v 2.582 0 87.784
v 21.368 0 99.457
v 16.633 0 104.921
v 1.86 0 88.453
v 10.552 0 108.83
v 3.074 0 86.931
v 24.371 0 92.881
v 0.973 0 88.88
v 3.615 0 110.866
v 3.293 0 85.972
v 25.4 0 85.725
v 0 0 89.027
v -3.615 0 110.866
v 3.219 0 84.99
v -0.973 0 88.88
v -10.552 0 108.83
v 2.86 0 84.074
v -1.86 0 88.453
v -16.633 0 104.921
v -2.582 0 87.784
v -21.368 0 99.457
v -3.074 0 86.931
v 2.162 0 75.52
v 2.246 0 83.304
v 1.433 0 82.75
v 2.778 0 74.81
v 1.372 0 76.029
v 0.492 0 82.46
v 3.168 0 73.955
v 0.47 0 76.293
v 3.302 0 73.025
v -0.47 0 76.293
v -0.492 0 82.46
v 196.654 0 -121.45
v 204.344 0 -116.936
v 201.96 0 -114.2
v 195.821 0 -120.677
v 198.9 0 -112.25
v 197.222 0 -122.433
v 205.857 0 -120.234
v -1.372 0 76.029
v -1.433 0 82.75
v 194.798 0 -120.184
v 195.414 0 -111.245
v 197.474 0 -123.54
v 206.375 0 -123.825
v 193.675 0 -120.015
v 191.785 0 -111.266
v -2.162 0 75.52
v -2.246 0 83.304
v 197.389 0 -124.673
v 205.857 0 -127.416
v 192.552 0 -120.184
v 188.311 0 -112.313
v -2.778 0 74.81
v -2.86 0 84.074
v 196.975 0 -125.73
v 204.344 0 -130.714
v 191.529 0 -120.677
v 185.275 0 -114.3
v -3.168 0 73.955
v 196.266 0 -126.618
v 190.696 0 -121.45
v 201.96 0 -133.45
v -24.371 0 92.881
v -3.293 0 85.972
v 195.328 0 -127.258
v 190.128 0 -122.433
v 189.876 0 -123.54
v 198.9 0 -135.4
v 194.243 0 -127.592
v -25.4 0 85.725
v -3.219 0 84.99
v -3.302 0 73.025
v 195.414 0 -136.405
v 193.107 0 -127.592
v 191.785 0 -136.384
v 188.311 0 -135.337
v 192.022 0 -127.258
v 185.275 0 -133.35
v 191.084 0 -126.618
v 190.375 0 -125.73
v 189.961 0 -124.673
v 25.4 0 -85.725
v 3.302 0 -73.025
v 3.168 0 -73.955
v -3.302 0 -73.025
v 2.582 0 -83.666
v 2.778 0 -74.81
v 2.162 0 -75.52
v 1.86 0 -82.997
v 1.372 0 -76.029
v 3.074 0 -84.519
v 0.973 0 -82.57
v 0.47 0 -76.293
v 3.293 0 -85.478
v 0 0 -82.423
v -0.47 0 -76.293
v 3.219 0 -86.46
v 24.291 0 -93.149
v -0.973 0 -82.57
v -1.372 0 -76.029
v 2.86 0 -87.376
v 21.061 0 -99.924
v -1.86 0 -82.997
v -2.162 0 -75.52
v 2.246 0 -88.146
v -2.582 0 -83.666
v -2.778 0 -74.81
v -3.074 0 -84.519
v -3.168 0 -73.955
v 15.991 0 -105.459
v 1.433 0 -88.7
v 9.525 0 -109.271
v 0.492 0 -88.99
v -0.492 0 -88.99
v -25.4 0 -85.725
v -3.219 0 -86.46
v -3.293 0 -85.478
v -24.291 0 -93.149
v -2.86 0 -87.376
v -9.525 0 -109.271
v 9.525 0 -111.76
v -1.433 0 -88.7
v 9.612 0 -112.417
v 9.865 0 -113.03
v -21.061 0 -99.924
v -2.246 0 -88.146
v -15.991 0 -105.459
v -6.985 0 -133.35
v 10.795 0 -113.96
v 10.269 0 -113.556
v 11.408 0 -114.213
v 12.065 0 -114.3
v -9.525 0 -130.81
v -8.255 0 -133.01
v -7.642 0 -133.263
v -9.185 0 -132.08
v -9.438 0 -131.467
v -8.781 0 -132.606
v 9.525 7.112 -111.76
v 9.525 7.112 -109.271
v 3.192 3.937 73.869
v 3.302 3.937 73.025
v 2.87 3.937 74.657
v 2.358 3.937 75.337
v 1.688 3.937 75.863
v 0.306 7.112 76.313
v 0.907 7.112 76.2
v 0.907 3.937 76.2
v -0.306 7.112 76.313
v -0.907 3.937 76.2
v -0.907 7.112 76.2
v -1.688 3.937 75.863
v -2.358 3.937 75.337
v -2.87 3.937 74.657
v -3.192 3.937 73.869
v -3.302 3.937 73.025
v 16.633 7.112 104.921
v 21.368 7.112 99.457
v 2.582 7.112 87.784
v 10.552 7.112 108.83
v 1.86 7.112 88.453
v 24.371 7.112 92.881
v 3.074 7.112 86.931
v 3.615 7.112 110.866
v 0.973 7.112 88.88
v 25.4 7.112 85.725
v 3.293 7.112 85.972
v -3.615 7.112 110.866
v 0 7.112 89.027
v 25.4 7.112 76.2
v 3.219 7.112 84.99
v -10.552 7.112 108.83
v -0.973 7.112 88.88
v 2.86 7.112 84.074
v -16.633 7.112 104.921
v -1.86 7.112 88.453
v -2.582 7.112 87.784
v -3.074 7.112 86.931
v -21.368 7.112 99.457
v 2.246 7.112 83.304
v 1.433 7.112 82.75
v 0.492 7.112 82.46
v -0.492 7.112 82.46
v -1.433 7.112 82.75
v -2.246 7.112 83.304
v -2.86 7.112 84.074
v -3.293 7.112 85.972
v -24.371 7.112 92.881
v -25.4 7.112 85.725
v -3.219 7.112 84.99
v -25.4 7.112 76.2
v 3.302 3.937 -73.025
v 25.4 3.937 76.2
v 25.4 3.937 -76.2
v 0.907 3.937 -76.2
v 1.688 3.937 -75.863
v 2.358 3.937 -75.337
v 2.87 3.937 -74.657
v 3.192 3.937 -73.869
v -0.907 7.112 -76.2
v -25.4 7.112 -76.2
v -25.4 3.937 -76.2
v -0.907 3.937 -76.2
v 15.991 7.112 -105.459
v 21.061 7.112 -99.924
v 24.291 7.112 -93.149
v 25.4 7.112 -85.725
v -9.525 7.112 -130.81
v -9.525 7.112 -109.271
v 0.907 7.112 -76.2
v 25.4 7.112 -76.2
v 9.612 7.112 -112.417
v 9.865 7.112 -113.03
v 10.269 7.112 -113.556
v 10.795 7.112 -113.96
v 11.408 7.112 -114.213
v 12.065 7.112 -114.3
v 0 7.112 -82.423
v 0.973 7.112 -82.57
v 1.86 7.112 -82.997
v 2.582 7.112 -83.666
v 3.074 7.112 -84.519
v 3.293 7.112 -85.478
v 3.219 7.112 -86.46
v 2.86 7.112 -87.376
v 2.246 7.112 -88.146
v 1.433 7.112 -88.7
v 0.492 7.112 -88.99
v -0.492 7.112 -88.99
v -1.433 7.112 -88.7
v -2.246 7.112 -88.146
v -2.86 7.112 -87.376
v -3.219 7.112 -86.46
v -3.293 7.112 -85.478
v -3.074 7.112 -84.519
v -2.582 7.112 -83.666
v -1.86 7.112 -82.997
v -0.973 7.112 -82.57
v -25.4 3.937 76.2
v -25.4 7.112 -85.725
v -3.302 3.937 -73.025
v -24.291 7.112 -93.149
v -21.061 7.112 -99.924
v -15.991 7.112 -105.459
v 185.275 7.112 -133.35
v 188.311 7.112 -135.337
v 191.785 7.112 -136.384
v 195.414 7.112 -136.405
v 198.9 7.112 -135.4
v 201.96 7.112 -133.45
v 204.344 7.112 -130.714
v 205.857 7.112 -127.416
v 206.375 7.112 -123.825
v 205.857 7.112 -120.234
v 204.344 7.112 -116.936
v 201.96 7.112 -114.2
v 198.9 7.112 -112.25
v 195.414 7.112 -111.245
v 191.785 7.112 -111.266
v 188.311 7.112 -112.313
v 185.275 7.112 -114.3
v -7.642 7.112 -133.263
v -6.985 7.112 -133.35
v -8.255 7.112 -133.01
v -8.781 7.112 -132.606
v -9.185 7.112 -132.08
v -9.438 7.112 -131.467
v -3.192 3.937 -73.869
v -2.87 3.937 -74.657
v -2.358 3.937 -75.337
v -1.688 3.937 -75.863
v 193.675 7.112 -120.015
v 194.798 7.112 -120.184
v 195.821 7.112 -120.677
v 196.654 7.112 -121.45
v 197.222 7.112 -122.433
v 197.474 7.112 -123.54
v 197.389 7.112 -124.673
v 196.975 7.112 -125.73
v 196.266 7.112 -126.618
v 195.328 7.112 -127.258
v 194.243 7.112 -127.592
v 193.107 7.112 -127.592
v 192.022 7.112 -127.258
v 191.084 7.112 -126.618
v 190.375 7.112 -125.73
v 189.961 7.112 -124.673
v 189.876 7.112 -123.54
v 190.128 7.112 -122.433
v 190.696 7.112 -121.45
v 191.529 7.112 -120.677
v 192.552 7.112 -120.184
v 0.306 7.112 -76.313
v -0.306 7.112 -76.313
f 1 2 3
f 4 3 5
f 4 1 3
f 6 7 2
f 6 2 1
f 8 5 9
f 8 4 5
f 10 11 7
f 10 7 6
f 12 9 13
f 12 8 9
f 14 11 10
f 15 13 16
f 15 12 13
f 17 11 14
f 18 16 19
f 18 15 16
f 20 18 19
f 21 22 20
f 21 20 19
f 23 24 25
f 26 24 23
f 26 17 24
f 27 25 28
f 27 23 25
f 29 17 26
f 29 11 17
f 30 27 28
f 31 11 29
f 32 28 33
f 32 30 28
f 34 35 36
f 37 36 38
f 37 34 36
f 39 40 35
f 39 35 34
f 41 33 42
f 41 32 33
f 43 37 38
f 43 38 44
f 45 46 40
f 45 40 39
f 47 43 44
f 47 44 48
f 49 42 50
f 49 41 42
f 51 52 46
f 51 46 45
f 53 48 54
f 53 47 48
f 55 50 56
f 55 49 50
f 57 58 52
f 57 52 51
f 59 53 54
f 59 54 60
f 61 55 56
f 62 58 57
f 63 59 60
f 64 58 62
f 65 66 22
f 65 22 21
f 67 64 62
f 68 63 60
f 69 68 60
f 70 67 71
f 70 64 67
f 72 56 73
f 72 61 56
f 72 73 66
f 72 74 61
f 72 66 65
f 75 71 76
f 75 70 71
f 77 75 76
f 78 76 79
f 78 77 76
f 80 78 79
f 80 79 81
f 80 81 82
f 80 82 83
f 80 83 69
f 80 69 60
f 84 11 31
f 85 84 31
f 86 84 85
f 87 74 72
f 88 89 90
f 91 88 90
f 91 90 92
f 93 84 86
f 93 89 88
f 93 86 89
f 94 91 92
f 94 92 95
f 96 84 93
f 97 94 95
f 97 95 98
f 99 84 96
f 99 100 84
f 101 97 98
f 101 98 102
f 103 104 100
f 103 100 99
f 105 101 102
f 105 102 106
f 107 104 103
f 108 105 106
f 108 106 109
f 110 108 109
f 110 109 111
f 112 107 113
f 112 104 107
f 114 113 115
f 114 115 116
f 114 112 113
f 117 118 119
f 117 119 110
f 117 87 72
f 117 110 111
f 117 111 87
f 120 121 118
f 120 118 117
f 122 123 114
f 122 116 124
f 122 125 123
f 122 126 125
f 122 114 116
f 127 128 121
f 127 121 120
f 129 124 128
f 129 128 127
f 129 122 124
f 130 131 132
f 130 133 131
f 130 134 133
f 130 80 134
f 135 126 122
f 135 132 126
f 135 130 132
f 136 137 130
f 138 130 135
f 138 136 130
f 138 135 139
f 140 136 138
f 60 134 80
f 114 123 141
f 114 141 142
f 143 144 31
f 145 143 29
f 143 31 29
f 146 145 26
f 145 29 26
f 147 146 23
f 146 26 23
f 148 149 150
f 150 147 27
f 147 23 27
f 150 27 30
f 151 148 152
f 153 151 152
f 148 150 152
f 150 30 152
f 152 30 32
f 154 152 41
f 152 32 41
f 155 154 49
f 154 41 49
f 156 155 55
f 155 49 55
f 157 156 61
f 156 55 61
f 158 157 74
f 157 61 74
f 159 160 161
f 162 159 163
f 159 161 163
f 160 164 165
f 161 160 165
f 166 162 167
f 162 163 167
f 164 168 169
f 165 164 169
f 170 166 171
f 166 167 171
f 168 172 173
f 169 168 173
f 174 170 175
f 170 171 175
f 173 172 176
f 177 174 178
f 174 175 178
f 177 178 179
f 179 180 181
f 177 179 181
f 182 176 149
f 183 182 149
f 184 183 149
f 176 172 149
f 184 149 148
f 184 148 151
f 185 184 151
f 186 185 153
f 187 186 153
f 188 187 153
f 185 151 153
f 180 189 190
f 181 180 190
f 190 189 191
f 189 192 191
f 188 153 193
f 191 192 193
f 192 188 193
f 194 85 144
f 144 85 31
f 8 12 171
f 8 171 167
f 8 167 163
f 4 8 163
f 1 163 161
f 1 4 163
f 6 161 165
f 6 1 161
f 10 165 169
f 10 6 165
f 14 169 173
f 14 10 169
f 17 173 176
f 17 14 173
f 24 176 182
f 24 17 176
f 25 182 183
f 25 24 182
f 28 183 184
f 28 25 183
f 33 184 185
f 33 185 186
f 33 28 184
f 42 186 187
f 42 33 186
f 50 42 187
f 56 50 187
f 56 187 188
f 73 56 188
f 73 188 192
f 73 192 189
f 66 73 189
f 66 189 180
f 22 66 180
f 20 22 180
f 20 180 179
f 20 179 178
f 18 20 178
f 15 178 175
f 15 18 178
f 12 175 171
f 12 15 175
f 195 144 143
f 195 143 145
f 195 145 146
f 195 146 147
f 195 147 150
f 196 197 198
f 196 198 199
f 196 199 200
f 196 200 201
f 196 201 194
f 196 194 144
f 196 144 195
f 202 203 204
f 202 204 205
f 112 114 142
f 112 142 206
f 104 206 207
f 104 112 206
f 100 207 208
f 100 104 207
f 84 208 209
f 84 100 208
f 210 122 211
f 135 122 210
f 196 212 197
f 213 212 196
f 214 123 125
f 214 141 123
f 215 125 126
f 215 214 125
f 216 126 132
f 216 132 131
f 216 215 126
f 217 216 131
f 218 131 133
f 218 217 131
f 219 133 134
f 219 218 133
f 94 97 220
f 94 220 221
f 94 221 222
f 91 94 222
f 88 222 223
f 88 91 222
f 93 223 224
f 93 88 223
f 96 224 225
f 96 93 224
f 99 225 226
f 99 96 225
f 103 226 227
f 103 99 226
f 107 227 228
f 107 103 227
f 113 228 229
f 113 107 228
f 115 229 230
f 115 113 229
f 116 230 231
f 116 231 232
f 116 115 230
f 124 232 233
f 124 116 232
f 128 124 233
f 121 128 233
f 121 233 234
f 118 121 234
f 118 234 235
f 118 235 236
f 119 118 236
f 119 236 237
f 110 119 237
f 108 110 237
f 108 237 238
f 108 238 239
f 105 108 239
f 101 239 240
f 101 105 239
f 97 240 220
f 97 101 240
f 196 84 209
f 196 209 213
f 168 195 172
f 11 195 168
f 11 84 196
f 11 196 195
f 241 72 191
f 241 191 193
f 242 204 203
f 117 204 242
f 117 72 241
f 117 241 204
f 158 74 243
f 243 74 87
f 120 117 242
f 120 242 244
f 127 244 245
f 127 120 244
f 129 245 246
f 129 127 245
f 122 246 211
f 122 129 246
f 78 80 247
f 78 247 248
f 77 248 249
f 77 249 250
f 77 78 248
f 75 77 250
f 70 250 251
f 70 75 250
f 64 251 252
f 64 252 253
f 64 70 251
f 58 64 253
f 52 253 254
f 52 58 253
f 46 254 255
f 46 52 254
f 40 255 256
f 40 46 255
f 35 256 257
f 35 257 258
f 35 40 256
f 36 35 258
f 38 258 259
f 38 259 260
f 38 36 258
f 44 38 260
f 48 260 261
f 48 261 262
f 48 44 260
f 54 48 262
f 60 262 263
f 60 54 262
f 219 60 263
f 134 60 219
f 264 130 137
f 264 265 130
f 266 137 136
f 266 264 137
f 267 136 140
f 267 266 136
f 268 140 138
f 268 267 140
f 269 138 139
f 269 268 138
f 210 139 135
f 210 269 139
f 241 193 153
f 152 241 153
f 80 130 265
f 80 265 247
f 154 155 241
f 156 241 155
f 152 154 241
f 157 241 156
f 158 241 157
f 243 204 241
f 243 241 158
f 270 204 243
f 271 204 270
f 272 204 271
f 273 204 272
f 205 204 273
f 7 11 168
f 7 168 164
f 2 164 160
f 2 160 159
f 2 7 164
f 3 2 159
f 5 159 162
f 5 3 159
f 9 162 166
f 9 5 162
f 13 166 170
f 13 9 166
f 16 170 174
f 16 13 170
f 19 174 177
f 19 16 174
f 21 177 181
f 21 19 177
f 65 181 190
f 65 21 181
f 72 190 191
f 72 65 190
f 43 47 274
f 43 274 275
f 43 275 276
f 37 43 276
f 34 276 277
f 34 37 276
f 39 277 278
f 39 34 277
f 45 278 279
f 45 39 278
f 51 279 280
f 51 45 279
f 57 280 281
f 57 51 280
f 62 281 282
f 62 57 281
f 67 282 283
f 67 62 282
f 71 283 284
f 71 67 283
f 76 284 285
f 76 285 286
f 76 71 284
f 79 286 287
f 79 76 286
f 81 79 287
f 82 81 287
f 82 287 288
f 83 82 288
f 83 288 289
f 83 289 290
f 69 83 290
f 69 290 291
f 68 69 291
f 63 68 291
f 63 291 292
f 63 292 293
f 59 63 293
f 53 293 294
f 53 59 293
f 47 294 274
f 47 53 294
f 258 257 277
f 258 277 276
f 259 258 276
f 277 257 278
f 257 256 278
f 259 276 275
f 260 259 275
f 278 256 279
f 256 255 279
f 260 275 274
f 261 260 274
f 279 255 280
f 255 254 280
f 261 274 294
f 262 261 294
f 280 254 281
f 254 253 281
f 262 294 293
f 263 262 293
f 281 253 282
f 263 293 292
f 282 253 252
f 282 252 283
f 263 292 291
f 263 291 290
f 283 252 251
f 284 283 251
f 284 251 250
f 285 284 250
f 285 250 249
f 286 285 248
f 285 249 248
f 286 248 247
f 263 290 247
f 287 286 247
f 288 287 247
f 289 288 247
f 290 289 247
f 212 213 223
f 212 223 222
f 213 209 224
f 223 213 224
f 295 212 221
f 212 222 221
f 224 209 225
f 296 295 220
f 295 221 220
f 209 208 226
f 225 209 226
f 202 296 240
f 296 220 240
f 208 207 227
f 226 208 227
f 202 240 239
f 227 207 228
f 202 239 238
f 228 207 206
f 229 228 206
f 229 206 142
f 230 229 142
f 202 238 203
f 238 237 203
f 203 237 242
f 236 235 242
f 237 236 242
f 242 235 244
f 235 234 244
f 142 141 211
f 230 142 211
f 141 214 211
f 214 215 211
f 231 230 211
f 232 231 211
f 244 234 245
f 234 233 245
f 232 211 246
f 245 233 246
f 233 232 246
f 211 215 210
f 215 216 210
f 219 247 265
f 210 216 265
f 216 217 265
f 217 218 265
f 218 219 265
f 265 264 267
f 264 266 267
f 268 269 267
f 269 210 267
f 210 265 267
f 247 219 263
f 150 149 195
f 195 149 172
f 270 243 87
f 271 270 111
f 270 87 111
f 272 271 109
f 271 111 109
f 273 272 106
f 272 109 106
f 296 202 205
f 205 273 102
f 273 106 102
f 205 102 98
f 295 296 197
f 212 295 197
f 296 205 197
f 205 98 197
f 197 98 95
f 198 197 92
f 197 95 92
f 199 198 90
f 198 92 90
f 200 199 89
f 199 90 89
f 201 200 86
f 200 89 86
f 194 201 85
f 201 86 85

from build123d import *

# Parameters (mm, degrees)
SKETCH1_R           = 3.302
BOSS_EXTRUDE1_DEPTH = 7.112
SKETCH2_W           = 50.8
SKETCH2_H           = 152.4
CUT_EXTRUDE1_DEPTH  = 3.175
SKETCH3_R           = 3.81
BOSS_EXTRUDE2_DEPTH = 7.112
FILLET1_R           = 2.54


with BuildPart() as part:
    # Sketch1 → Boss-Extrude1 (new body)
    with BuildSketch(Plane(origin=(0, 0, 0), x_dir=(1, 0, 0), z_dir=(0, 1, 0))):
        with BuildLine():
            Line((25.4, 85.725), (25.4, -85.725))
            ThreePointArc((25.4, -85.725), (0, -111.125), (-25.4, -85.725))
            Line((-25.4, -85.725), (-25.4, 85.725))
            ThreePointArc((-25.4, 85.725), (0, 111.125), (25.4, 85.725))
        make_face()
        with Locations(Location((0, 85.725, 0), (0, 0, 270))):
            Circle(SKETCH1_R, mode=Mode.SUBTRACT)
        with Locations(Location((0, -85.725, 0), (0, 0, 270))):
            Circle(SKETCH1_R, mode=Mode.SUBTRACT)
        with BuildLine():
            Line((3.302, 73.025), (3.302, -73.025))
            ThreePointArc((3.302, -73.025), (0, -76.327), (-3.302, -73.025))
            Line((-3.302, -73.025), (-3.302, 73.025))
            ThreePointArc((-3.302, 73.025), (0, 76.327), (3.302, 73.025))
        make_face(mode=Mode.SUBTRACT)
    extrude(amount=BOSS_EXTRUDE1_DEPTH)

    # Sketch2 → Cut-Extrude1 (cut)
    with BuildSketch(Plane(origin=(0, 7.112, 0), x_dir=(1, 0, 0), z_dir=(0, 1, 0))):
        Rectangle(SKETCH2_W, SKETCH2_H)
    extrude(amount=-CUT_EXTRUDE1_DEPTH, mode=Mode.SUBTRACT)

    # Sketch3 → Boss-Extrude2 (add)
    with BuildSketch(Plane(origin=(0, 0, 0), x_dir=(1, 0, 0), z_dir=(0, 1, 0))):
        with BuildLine():
            Line((-9.525, 85.725), (-9.525, 133.35))
            Line((-9.525, 133.35), (185.274739587, 133.35))
            ThreePointArc((185.274739587, 133.35), (206.375, 123.825), (185.274739587, 114.3))
            Line((185.274739587, 114.3), (9.525, 114.3))
            Line((9.525, 114.3), (9.525, 85.725))
            Line((9.525, 85.725), (0, 95.25))
            Line((0, 95.25), (-9.525, 85.725))
        make_face()
        with Locations(Location((193.675, 123.825, 0), (0, 0, 270))):
            Circle(SKETCH3_R, mode=Mode.SUBTRACT)
    extrude(amount=BOSS_EXTRUDE2_DEPTH)

    # Fillet1
    fillet1_edges = [part.edges().sort_by_distance(p)[0] for p in [
        (-9.525, 3.556, -133.35),
        (9.525, 3.556, -114.3),
    ]]
    fillet(fillet1_edges, radius=FILLET1_R)


solid = part.part
